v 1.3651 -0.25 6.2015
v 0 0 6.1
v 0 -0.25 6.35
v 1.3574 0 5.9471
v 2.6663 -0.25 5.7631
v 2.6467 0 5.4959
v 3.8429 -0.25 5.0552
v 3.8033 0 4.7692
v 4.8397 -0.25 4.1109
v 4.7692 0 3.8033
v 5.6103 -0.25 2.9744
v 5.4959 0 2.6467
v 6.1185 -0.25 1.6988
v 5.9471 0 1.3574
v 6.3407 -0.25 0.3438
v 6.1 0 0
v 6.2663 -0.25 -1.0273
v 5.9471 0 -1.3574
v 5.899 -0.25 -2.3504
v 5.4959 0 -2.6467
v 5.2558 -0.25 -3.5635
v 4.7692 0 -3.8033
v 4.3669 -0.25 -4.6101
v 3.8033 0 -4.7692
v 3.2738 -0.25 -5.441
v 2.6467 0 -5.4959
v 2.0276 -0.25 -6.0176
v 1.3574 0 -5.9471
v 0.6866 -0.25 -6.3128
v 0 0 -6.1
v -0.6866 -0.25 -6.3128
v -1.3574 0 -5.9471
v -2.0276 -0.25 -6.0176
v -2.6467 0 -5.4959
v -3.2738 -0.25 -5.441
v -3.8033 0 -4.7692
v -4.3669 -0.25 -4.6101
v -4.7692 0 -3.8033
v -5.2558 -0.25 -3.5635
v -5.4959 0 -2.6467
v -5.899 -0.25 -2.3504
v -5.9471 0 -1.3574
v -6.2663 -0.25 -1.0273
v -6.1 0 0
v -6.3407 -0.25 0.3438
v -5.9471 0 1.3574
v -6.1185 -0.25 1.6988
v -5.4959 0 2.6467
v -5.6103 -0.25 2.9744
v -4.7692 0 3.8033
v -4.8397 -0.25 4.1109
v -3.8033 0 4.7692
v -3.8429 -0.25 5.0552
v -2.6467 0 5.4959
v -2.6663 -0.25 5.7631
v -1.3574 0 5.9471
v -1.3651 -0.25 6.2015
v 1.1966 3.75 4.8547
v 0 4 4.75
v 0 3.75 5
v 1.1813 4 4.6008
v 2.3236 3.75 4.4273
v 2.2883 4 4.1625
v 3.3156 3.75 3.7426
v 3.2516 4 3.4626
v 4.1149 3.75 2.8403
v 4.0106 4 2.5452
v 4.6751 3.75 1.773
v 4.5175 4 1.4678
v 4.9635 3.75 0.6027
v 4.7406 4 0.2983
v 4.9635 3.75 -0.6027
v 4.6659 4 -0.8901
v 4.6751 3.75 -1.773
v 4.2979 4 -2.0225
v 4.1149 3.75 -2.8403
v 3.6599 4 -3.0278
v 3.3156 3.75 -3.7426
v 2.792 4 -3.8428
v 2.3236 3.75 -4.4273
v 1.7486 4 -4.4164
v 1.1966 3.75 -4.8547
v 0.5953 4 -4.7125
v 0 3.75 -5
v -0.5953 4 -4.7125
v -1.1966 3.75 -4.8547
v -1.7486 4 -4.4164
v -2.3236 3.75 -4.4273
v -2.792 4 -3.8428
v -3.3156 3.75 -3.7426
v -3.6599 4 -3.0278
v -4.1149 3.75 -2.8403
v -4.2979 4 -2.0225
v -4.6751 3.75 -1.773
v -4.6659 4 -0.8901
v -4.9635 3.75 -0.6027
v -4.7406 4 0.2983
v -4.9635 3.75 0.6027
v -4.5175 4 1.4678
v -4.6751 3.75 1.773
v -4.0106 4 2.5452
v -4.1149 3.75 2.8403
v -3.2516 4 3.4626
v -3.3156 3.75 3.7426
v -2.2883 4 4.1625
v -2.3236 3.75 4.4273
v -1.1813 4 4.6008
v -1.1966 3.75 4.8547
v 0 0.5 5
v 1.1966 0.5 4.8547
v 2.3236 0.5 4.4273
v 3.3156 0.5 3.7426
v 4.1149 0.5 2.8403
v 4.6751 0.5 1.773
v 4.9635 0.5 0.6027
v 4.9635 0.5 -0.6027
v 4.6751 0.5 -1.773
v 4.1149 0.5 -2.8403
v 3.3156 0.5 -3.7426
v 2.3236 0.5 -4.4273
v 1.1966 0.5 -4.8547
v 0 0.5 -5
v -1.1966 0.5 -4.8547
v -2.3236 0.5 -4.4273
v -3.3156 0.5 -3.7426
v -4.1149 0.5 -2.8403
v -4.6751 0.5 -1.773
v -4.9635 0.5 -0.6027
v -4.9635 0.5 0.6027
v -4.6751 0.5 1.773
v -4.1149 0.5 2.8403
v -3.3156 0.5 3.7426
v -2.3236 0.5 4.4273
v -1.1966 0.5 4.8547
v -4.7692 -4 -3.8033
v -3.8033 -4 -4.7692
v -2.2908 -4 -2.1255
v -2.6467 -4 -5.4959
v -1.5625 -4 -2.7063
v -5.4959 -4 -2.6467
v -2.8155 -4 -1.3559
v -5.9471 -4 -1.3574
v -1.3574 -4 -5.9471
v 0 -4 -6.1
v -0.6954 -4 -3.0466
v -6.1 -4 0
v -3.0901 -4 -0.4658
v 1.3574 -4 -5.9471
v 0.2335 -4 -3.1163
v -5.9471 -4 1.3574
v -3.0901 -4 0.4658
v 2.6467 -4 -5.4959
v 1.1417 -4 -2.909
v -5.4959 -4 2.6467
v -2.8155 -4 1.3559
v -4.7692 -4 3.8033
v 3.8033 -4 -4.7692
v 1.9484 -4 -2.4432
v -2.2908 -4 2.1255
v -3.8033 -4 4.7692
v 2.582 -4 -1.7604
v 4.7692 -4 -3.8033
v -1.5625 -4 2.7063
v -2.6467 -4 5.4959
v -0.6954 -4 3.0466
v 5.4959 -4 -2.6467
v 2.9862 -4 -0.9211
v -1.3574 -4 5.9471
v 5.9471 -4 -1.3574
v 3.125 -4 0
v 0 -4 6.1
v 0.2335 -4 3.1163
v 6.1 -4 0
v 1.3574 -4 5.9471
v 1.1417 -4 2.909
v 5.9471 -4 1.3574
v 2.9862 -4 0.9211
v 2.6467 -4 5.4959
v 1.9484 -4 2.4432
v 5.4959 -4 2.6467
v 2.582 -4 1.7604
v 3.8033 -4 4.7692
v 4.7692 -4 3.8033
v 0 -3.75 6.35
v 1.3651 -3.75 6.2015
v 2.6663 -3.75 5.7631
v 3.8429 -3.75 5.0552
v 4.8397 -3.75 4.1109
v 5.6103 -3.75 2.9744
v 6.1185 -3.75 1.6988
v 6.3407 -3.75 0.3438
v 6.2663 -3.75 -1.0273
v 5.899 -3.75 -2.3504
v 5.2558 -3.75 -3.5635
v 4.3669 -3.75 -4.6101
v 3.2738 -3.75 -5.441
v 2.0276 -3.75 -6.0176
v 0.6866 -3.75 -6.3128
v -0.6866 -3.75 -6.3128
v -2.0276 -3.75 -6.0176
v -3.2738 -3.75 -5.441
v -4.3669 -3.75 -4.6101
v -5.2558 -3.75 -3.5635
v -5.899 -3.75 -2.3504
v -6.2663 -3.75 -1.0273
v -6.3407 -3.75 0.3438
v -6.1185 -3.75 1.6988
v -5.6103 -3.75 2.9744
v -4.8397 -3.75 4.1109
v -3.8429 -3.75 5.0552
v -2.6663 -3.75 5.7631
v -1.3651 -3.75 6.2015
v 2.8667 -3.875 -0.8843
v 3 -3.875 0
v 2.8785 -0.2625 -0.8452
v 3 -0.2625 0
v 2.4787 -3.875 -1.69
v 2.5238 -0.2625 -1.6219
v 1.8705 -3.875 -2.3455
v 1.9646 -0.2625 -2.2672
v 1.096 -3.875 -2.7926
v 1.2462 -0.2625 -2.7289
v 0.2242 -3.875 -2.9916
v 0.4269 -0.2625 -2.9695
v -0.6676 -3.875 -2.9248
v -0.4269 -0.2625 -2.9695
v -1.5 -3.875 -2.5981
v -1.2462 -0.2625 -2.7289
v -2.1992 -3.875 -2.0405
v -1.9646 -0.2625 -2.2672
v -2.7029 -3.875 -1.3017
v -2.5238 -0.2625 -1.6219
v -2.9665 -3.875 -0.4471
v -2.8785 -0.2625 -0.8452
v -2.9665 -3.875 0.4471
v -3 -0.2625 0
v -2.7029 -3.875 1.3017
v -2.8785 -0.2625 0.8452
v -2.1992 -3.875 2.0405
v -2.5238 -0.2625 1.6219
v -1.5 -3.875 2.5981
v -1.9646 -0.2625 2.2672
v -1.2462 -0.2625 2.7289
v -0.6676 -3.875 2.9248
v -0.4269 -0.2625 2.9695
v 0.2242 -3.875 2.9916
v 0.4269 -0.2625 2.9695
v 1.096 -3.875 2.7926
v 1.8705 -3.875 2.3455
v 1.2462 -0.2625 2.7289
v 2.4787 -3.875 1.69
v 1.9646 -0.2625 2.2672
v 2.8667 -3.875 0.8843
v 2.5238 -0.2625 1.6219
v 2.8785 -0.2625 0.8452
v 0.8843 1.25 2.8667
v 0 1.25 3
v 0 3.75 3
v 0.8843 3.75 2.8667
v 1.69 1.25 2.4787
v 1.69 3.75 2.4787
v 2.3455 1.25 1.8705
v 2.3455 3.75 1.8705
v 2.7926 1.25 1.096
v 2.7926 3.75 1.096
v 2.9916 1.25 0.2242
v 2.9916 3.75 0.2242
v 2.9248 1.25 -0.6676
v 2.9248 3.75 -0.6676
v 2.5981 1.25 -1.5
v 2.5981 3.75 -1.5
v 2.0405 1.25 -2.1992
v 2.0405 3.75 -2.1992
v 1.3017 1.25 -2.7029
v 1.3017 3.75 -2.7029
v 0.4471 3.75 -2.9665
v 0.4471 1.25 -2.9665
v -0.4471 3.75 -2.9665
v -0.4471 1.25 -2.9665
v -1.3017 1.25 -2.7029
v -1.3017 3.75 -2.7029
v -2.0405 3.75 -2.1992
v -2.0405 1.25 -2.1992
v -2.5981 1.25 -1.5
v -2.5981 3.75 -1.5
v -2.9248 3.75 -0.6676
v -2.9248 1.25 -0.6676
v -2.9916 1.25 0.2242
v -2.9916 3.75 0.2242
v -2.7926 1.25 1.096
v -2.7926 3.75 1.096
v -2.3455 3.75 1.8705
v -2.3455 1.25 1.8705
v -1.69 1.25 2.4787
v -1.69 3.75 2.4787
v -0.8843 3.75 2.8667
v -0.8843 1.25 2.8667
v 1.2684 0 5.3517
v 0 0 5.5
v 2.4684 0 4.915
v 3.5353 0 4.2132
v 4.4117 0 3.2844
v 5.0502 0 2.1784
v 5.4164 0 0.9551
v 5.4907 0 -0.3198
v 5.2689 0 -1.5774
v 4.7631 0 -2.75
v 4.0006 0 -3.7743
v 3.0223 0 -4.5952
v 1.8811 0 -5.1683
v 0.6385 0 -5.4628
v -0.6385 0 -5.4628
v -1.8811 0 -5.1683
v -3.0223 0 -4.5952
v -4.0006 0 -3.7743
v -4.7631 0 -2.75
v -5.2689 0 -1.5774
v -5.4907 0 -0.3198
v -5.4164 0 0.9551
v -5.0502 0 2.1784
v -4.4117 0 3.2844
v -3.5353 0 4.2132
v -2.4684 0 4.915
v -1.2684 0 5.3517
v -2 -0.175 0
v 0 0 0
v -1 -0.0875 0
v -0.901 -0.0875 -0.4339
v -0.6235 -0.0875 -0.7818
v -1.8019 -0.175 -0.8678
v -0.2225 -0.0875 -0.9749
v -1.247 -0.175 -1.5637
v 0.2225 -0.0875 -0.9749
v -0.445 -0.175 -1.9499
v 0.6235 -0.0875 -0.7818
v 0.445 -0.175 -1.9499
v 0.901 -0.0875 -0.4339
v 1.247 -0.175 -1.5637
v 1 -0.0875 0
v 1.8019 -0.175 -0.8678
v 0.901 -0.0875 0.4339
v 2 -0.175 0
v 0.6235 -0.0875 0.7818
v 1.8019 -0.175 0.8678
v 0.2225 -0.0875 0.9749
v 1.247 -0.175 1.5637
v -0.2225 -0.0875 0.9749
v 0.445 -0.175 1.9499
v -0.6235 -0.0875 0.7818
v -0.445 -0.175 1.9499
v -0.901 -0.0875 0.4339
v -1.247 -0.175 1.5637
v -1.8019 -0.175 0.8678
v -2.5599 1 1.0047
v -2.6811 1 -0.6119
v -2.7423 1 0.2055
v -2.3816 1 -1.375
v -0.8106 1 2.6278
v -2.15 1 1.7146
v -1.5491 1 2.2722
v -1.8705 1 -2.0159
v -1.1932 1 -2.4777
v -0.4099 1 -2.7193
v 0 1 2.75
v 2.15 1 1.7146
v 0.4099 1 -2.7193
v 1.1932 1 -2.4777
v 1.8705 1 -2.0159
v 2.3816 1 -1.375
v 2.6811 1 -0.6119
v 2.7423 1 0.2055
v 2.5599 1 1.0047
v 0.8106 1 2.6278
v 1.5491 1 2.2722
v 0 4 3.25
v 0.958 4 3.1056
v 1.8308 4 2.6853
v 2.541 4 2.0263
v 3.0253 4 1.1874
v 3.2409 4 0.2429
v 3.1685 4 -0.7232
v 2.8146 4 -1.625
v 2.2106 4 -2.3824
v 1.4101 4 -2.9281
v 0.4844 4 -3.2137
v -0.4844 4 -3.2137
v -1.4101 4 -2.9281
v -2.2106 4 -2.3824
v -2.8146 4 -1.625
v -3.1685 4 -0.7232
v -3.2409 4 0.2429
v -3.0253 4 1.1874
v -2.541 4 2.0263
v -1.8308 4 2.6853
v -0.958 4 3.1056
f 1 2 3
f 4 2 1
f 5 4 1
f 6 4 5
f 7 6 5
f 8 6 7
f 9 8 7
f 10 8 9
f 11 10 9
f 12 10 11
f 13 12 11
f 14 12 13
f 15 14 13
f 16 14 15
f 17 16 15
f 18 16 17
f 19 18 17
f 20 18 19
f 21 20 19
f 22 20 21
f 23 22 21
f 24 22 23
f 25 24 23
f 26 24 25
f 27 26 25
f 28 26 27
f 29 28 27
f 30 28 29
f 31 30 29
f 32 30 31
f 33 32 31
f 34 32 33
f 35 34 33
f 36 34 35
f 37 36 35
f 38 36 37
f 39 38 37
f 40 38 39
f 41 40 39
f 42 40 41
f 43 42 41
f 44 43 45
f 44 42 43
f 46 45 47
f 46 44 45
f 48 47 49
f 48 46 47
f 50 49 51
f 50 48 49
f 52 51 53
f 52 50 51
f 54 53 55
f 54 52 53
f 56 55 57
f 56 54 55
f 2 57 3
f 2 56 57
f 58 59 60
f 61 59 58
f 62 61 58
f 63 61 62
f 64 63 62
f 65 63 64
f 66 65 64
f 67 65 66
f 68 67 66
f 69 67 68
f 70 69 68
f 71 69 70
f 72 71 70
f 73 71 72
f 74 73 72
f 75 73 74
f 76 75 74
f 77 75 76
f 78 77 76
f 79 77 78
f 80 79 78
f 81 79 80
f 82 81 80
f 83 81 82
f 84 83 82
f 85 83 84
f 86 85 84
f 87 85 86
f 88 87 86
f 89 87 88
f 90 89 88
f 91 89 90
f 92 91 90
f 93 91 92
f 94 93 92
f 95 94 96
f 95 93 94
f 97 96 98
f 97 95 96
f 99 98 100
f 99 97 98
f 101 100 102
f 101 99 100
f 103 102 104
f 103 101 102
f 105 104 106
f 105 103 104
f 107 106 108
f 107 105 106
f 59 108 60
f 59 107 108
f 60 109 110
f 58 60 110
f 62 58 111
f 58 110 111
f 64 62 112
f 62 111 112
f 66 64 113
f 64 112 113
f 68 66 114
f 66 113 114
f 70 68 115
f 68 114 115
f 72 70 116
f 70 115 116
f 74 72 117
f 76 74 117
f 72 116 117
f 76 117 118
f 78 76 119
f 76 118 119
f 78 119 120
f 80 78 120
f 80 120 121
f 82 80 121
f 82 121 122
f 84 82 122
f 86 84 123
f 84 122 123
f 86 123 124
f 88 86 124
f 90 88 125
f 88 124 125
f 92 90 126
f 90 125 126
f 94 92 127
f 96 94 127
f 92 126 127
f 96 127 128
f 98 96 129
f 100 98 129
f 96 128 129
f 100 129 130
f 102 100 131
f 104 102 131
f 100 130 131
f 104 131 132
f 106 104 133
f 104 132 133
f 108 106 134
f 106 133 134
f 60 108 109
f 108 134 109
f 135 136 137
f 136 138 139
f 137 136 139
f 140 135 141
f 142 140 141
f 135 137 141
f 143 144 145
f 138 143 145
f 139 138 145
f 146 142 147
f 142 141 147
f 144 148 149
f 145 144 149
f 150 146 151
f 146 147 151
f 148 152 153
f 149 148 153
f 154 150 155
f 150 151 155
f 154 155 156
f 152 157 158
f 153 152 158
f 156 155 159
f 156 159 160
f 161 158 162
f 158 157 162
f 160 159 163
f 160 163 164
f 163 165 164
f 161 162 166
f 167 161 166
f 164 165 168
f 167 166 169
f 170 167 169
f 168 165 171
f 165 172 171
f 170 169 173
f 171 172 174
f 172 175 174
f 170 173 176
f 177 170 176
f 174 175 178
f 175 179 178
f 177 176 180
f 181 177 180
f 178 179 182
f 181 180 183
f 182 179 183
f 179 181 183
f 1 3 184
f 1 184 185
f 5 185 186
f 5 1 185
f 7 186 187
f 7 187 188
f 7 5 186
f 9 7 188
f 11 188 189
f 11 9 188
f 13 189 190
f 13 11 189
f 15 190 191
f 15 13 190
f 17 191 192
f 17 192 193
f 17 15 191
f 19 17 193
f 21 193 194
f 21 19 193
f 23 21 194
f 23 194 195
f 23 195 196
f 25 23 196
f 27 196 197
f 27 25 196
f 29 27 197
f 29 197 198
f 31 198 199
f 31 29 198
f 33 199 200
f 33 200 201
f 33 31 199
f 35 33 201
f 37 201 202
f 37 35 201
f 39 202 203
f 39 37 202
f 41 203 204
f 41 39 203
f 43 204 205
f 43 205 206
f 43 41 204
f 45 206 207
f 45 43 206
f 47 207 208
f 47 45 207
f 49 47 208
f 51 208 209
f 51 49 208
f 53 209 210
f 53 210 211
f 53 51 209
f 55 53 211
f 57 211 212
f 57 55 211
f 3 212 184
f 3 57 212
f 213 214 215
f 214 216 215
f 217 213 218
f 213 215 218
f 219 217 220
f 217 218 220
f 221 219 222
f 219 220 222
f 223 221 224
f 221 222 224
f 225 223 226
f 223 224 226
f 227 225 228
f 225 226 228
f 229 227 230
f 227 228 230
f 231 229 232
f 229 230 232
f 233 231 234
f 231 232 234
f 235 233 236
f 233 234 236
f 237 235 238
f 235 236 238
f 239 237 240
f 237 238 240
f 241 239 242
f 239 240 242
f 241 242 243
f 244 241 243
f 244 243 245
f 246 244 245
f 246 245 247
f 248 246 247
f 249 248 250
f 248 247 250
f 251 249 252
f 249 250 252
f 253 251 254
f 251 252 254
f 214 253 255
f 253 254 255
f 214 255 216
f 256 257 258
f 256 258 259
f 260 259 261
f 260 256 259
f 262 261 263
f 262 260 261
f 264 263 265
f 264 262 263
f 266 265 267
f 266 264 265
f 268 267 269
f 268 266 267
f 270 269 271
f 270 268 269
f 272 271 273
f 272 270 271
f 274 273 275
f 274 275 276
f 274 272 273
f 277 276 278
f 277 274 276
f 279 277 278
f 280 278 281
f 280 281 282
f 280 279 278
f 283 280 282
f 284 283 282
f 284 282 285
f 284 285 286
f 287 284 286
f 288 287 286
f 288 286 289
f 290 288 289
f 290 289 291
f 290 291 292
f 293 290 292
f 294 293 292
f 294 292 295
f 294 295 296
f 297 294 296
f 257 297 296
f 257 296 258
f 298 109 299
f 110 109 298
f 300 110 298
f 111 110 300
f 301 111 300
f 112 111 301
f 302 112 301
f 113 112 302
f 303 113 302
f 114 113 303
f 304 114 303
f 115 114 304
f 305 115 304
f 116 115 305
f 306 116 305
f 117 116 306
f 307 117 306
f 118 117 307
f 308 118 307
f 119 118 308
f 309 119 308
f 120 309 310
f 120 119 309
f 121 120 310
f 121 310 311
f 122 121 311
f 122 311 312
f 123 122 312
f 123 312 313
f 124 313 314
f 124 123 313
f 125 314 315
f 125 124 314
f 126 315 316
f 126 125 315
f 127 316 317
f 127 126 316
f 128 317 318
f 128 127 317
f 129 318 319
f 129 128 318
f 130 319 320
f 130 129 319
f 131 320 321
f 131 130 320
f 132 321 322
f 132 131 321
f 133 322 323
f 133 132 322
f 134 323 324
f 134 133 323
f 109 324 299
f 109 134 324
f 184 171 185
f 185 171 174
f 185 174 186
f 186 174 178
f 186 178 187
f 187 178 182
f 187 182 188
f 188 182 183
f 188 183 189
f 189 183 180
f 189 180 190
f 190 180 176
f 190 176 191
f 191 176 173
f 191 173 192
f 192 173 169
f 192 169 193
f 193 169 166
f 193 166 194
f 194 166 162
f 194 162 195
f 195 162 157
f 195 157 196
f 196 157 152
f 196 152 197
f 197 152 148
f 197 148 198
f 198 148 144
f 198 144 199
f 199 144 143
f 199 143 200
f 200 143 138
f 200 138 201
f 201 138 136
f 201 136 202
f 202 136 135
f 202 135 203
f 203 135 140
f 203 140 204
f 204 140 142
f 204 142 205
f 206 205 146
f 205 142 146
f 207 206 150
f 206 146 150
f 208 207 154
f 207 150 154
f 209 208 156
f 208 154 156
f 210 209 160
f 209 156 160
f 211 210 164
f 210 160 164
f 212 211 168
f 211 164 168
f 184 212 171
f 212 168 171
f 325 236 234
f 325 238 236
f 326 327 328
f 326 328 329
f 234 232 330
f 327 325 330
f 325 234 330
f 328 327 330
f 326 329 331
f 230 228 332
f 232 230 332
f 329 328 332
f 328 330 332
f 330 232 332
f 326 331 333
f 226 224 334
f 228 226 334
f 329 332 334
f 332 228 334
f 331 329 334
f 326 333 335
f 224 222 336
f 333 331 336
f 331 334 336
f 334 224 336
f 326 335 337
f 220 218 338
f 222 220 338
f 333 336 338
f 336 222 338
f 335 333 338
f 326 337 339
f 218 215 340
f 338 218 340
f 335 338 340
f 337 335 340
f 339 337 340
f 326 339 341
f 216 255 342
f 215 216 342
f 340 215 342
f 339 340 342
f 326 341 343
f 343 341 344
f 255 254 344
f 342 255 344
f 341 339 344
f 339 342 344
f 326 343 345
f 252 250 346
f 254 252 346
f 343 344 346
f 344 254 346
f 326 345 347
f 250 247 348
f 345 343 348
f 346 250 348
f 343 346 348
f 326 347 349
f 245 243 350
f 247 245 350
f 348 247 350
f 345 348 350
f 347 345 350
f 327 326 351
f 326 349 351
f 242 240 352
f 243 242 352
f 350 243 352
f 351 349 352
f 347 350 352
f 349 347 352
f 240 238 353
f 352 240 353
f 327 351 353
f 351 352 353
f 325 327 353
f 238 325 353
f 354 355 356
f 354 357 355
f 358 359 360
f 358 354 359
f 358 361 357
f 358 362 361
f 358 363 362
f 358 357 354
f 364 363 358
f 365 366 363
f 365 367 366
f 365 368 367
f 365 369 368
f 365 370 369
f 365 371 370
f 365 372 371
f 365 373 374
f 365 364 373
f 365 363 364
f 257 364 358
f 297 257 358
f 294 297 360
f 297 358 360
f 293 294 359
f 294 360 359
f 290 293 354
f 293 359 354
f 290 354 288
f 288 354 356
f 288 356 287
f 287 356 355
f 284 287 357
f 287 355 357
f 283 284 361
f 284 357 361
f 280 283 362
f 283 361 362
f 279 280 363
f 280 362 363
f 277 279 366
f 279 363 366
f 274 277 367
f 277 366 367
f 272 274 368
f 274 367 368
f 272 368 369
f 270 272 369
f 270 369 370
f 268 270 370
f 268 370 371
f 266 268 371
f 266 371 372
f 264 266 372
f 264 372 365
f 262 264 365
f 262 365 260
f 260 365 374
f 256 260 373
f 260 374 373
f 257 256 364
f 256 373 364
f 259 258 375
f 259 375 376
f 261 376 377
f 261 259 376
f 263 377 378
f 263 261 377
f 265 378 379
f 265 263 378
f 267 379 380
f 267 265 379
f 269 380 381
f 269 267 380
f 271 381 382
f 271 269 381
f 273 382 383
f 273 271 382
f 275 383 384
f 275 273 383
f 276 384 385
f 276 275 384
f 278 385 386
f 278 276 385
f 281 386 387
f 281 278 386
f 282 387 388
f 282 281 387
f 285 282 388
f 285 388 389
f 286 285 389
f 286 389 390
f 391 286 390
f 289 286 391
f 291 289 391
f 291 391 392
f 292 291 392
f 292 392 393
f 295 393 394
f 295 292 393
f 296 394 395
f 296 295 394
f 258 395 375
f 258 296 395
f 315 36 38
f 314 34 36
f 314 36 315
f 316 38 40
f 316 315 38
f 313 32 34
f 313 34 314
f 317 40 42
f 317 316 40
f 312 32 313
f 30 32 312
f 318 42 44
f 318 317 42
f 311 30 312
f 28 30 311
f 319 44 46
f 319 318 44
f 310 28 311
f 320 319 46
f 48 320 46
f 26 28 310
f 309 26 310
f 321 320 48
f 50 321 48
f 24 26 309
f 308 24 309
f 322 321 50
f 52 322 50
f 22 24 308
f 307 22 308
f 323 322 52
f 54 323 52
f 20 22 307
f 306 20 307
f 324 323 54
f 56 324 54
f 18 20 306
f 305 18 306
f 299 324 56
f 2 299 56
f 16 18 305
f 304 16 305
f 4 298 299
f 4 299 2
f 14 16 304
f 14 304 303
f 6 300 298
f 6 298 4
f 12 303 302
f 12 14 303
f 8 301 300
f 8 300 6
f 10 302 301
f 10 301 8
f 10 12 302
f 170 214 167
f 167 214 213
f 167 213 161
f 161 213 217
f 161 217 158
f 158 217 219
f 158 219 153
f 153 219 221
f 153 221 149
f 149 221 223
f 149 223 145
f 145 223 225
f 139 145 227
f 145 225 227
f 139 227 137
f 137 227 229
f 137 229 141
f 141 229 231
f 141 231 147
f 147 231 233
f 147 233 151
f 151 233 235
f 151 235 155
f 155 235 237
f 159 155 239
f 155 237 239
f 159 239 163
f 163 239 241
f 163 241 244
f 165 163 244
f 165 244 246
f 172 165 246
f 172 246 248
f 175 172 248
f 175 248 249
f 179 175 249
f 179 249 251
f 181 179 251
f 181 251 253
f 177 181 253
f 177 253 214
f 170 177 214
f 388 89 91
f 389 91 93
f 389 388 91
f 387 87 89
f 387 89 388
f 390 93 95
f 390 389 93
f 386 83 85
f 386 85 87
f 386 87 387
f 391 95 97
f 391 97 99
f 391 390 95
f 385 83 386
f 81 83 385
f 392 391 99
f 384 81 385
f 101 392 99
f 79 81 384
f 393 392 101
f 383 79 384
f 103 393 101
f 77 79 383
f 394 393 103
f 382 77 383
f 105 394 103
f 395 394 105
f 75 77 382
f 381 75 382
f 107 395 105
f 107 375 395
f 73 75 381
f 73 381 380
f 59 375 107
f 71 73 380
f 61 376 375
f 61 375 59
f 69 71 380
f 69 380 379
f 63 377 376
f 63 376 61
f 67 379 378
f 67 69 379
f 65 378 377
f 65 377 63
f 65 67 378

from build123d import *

# Parameters (mm, degrees)
SKETCH1_R                       = 5
BOSS_EXTRUDE1_DEPTH             = 1
SKETCH1_3_R                     = 5
SKETCH1_3_R_2                   = 3
BOSS_EXTRUDE2_DEPTH             = 4
CHAMFER1_SIZE                   = 0.25
SKETCH5_R                       = 6.35
BOSS_EXTRUDE4_DEPTH             = 4
F_6_0MM_DOWEL_HOLE1_D           = 6
F_6_0MM_DOWEL_HOLE1_DEPTH       = 3.737534009
F_6_0MM_DOWEL_HOLE1_CSINK_D     = 6.25
F_6_0MM_DOWEL_HOLE1_CSINK_ANGLE = 90
F_6_0MM_DOWEL_HOLE1_TIP         = 0.262465991
CHAMFER2_SIZE                   = 0.25
CHAMFER3_SIZE                   = 0.5


with BuildPart() as part:
    # Sketch1 → Boss-Extrude1 (new body)
    with BuildSketch(Plane(origin=(0, 0, 0), x_dir=(1, 0, 0), z_dir=(0, 1, 0))):
        Circle(SKETCH1_R)
    extrude(amount=BOSS_EXTRUDE1_DEPTH)

    # Sketch1<3> → Boss-Extrude2 (add)
    with BuildSketch(Plane(origin=(0, 0, 0), x_dir=(1, 0, 0), z_dir=(0, 1, 0))):
        Circle(SKETCH1_3_R)
        Circle(SKETCH1_3_R_2, mode=Mode.SUBTRACT)
    extrude(amount=BOSS_EXTRUDE2_DEPTH)

    # Chamfer1
    chamfer1_edges = [part.edges().sort_by_distance(p)[0] for p in [
        (-3, 4, 0),
        (-5, 4, 0),
        (-3, 1, 0),
    ]]
    chamfer(chamfer1_edges, length=CHAMFER1_SIZE)

    # Sketch5 → Boss-Extrude4 (add)
    with BuildSketch(Plane(origin=(0, 0, 0), x_dir=(1, 0, 0), z_dir=(0, 1, 0))):
        Circle(SKETCH5_R)
    extrude(amount=-BOSS_EXTRUDE4_DEPTH)

    # Ø6.0mm Dowel Hole1
    with Locations(Plane(origin=(0, -4, 0), x_dir=(-1, 0, 0), z_dir=(0, -1, 0))):
        with Locations((0, 0)):
            CounterSinkHole(F_6_0MM_DOWEL_HOLE1_D / 2, F_6_0MM_DOWEL_HOLE1_CSINK_D / 2, depth=F_6_0MM_DOWEL_HOLE1_DEPTH, counter_sink_angle=F_6_0MM_DOWEL_HOLE1_CSINK_ANGLE)
            with Locations((0, 0, -(F_6_0MM_DOWEL_HOLE1_DEPTH + F_6_0MM_DOWEL_HOLE1_TIP / 2))):  # 170° drill point
                Cone(0, F_6_0MM_DOWEL_HOLE1_D / 2, F_6_0MM_DOWEL_HOLE1_TIP, mode=Mode.SUBTRACT)

    # Chamfer2
    chamfer2_edges = [part.edges().sort_by_distance(p)[0] for p in [
        (-6.35, -4, 0),
        (-6.35, 0, 0),
    ]]
    chamfer(chamfer2_edges, length=CHAMFER2_SIZE)

    # Chamfer3
    chamfer3_edges = [part.edges().sort_by_distance(p)[0] for p in [
        (-5, 0, 0),
    ]]
    chamfer(chamfer3_edges, length=CHAMFER3_SIZE)


solid = part.part
